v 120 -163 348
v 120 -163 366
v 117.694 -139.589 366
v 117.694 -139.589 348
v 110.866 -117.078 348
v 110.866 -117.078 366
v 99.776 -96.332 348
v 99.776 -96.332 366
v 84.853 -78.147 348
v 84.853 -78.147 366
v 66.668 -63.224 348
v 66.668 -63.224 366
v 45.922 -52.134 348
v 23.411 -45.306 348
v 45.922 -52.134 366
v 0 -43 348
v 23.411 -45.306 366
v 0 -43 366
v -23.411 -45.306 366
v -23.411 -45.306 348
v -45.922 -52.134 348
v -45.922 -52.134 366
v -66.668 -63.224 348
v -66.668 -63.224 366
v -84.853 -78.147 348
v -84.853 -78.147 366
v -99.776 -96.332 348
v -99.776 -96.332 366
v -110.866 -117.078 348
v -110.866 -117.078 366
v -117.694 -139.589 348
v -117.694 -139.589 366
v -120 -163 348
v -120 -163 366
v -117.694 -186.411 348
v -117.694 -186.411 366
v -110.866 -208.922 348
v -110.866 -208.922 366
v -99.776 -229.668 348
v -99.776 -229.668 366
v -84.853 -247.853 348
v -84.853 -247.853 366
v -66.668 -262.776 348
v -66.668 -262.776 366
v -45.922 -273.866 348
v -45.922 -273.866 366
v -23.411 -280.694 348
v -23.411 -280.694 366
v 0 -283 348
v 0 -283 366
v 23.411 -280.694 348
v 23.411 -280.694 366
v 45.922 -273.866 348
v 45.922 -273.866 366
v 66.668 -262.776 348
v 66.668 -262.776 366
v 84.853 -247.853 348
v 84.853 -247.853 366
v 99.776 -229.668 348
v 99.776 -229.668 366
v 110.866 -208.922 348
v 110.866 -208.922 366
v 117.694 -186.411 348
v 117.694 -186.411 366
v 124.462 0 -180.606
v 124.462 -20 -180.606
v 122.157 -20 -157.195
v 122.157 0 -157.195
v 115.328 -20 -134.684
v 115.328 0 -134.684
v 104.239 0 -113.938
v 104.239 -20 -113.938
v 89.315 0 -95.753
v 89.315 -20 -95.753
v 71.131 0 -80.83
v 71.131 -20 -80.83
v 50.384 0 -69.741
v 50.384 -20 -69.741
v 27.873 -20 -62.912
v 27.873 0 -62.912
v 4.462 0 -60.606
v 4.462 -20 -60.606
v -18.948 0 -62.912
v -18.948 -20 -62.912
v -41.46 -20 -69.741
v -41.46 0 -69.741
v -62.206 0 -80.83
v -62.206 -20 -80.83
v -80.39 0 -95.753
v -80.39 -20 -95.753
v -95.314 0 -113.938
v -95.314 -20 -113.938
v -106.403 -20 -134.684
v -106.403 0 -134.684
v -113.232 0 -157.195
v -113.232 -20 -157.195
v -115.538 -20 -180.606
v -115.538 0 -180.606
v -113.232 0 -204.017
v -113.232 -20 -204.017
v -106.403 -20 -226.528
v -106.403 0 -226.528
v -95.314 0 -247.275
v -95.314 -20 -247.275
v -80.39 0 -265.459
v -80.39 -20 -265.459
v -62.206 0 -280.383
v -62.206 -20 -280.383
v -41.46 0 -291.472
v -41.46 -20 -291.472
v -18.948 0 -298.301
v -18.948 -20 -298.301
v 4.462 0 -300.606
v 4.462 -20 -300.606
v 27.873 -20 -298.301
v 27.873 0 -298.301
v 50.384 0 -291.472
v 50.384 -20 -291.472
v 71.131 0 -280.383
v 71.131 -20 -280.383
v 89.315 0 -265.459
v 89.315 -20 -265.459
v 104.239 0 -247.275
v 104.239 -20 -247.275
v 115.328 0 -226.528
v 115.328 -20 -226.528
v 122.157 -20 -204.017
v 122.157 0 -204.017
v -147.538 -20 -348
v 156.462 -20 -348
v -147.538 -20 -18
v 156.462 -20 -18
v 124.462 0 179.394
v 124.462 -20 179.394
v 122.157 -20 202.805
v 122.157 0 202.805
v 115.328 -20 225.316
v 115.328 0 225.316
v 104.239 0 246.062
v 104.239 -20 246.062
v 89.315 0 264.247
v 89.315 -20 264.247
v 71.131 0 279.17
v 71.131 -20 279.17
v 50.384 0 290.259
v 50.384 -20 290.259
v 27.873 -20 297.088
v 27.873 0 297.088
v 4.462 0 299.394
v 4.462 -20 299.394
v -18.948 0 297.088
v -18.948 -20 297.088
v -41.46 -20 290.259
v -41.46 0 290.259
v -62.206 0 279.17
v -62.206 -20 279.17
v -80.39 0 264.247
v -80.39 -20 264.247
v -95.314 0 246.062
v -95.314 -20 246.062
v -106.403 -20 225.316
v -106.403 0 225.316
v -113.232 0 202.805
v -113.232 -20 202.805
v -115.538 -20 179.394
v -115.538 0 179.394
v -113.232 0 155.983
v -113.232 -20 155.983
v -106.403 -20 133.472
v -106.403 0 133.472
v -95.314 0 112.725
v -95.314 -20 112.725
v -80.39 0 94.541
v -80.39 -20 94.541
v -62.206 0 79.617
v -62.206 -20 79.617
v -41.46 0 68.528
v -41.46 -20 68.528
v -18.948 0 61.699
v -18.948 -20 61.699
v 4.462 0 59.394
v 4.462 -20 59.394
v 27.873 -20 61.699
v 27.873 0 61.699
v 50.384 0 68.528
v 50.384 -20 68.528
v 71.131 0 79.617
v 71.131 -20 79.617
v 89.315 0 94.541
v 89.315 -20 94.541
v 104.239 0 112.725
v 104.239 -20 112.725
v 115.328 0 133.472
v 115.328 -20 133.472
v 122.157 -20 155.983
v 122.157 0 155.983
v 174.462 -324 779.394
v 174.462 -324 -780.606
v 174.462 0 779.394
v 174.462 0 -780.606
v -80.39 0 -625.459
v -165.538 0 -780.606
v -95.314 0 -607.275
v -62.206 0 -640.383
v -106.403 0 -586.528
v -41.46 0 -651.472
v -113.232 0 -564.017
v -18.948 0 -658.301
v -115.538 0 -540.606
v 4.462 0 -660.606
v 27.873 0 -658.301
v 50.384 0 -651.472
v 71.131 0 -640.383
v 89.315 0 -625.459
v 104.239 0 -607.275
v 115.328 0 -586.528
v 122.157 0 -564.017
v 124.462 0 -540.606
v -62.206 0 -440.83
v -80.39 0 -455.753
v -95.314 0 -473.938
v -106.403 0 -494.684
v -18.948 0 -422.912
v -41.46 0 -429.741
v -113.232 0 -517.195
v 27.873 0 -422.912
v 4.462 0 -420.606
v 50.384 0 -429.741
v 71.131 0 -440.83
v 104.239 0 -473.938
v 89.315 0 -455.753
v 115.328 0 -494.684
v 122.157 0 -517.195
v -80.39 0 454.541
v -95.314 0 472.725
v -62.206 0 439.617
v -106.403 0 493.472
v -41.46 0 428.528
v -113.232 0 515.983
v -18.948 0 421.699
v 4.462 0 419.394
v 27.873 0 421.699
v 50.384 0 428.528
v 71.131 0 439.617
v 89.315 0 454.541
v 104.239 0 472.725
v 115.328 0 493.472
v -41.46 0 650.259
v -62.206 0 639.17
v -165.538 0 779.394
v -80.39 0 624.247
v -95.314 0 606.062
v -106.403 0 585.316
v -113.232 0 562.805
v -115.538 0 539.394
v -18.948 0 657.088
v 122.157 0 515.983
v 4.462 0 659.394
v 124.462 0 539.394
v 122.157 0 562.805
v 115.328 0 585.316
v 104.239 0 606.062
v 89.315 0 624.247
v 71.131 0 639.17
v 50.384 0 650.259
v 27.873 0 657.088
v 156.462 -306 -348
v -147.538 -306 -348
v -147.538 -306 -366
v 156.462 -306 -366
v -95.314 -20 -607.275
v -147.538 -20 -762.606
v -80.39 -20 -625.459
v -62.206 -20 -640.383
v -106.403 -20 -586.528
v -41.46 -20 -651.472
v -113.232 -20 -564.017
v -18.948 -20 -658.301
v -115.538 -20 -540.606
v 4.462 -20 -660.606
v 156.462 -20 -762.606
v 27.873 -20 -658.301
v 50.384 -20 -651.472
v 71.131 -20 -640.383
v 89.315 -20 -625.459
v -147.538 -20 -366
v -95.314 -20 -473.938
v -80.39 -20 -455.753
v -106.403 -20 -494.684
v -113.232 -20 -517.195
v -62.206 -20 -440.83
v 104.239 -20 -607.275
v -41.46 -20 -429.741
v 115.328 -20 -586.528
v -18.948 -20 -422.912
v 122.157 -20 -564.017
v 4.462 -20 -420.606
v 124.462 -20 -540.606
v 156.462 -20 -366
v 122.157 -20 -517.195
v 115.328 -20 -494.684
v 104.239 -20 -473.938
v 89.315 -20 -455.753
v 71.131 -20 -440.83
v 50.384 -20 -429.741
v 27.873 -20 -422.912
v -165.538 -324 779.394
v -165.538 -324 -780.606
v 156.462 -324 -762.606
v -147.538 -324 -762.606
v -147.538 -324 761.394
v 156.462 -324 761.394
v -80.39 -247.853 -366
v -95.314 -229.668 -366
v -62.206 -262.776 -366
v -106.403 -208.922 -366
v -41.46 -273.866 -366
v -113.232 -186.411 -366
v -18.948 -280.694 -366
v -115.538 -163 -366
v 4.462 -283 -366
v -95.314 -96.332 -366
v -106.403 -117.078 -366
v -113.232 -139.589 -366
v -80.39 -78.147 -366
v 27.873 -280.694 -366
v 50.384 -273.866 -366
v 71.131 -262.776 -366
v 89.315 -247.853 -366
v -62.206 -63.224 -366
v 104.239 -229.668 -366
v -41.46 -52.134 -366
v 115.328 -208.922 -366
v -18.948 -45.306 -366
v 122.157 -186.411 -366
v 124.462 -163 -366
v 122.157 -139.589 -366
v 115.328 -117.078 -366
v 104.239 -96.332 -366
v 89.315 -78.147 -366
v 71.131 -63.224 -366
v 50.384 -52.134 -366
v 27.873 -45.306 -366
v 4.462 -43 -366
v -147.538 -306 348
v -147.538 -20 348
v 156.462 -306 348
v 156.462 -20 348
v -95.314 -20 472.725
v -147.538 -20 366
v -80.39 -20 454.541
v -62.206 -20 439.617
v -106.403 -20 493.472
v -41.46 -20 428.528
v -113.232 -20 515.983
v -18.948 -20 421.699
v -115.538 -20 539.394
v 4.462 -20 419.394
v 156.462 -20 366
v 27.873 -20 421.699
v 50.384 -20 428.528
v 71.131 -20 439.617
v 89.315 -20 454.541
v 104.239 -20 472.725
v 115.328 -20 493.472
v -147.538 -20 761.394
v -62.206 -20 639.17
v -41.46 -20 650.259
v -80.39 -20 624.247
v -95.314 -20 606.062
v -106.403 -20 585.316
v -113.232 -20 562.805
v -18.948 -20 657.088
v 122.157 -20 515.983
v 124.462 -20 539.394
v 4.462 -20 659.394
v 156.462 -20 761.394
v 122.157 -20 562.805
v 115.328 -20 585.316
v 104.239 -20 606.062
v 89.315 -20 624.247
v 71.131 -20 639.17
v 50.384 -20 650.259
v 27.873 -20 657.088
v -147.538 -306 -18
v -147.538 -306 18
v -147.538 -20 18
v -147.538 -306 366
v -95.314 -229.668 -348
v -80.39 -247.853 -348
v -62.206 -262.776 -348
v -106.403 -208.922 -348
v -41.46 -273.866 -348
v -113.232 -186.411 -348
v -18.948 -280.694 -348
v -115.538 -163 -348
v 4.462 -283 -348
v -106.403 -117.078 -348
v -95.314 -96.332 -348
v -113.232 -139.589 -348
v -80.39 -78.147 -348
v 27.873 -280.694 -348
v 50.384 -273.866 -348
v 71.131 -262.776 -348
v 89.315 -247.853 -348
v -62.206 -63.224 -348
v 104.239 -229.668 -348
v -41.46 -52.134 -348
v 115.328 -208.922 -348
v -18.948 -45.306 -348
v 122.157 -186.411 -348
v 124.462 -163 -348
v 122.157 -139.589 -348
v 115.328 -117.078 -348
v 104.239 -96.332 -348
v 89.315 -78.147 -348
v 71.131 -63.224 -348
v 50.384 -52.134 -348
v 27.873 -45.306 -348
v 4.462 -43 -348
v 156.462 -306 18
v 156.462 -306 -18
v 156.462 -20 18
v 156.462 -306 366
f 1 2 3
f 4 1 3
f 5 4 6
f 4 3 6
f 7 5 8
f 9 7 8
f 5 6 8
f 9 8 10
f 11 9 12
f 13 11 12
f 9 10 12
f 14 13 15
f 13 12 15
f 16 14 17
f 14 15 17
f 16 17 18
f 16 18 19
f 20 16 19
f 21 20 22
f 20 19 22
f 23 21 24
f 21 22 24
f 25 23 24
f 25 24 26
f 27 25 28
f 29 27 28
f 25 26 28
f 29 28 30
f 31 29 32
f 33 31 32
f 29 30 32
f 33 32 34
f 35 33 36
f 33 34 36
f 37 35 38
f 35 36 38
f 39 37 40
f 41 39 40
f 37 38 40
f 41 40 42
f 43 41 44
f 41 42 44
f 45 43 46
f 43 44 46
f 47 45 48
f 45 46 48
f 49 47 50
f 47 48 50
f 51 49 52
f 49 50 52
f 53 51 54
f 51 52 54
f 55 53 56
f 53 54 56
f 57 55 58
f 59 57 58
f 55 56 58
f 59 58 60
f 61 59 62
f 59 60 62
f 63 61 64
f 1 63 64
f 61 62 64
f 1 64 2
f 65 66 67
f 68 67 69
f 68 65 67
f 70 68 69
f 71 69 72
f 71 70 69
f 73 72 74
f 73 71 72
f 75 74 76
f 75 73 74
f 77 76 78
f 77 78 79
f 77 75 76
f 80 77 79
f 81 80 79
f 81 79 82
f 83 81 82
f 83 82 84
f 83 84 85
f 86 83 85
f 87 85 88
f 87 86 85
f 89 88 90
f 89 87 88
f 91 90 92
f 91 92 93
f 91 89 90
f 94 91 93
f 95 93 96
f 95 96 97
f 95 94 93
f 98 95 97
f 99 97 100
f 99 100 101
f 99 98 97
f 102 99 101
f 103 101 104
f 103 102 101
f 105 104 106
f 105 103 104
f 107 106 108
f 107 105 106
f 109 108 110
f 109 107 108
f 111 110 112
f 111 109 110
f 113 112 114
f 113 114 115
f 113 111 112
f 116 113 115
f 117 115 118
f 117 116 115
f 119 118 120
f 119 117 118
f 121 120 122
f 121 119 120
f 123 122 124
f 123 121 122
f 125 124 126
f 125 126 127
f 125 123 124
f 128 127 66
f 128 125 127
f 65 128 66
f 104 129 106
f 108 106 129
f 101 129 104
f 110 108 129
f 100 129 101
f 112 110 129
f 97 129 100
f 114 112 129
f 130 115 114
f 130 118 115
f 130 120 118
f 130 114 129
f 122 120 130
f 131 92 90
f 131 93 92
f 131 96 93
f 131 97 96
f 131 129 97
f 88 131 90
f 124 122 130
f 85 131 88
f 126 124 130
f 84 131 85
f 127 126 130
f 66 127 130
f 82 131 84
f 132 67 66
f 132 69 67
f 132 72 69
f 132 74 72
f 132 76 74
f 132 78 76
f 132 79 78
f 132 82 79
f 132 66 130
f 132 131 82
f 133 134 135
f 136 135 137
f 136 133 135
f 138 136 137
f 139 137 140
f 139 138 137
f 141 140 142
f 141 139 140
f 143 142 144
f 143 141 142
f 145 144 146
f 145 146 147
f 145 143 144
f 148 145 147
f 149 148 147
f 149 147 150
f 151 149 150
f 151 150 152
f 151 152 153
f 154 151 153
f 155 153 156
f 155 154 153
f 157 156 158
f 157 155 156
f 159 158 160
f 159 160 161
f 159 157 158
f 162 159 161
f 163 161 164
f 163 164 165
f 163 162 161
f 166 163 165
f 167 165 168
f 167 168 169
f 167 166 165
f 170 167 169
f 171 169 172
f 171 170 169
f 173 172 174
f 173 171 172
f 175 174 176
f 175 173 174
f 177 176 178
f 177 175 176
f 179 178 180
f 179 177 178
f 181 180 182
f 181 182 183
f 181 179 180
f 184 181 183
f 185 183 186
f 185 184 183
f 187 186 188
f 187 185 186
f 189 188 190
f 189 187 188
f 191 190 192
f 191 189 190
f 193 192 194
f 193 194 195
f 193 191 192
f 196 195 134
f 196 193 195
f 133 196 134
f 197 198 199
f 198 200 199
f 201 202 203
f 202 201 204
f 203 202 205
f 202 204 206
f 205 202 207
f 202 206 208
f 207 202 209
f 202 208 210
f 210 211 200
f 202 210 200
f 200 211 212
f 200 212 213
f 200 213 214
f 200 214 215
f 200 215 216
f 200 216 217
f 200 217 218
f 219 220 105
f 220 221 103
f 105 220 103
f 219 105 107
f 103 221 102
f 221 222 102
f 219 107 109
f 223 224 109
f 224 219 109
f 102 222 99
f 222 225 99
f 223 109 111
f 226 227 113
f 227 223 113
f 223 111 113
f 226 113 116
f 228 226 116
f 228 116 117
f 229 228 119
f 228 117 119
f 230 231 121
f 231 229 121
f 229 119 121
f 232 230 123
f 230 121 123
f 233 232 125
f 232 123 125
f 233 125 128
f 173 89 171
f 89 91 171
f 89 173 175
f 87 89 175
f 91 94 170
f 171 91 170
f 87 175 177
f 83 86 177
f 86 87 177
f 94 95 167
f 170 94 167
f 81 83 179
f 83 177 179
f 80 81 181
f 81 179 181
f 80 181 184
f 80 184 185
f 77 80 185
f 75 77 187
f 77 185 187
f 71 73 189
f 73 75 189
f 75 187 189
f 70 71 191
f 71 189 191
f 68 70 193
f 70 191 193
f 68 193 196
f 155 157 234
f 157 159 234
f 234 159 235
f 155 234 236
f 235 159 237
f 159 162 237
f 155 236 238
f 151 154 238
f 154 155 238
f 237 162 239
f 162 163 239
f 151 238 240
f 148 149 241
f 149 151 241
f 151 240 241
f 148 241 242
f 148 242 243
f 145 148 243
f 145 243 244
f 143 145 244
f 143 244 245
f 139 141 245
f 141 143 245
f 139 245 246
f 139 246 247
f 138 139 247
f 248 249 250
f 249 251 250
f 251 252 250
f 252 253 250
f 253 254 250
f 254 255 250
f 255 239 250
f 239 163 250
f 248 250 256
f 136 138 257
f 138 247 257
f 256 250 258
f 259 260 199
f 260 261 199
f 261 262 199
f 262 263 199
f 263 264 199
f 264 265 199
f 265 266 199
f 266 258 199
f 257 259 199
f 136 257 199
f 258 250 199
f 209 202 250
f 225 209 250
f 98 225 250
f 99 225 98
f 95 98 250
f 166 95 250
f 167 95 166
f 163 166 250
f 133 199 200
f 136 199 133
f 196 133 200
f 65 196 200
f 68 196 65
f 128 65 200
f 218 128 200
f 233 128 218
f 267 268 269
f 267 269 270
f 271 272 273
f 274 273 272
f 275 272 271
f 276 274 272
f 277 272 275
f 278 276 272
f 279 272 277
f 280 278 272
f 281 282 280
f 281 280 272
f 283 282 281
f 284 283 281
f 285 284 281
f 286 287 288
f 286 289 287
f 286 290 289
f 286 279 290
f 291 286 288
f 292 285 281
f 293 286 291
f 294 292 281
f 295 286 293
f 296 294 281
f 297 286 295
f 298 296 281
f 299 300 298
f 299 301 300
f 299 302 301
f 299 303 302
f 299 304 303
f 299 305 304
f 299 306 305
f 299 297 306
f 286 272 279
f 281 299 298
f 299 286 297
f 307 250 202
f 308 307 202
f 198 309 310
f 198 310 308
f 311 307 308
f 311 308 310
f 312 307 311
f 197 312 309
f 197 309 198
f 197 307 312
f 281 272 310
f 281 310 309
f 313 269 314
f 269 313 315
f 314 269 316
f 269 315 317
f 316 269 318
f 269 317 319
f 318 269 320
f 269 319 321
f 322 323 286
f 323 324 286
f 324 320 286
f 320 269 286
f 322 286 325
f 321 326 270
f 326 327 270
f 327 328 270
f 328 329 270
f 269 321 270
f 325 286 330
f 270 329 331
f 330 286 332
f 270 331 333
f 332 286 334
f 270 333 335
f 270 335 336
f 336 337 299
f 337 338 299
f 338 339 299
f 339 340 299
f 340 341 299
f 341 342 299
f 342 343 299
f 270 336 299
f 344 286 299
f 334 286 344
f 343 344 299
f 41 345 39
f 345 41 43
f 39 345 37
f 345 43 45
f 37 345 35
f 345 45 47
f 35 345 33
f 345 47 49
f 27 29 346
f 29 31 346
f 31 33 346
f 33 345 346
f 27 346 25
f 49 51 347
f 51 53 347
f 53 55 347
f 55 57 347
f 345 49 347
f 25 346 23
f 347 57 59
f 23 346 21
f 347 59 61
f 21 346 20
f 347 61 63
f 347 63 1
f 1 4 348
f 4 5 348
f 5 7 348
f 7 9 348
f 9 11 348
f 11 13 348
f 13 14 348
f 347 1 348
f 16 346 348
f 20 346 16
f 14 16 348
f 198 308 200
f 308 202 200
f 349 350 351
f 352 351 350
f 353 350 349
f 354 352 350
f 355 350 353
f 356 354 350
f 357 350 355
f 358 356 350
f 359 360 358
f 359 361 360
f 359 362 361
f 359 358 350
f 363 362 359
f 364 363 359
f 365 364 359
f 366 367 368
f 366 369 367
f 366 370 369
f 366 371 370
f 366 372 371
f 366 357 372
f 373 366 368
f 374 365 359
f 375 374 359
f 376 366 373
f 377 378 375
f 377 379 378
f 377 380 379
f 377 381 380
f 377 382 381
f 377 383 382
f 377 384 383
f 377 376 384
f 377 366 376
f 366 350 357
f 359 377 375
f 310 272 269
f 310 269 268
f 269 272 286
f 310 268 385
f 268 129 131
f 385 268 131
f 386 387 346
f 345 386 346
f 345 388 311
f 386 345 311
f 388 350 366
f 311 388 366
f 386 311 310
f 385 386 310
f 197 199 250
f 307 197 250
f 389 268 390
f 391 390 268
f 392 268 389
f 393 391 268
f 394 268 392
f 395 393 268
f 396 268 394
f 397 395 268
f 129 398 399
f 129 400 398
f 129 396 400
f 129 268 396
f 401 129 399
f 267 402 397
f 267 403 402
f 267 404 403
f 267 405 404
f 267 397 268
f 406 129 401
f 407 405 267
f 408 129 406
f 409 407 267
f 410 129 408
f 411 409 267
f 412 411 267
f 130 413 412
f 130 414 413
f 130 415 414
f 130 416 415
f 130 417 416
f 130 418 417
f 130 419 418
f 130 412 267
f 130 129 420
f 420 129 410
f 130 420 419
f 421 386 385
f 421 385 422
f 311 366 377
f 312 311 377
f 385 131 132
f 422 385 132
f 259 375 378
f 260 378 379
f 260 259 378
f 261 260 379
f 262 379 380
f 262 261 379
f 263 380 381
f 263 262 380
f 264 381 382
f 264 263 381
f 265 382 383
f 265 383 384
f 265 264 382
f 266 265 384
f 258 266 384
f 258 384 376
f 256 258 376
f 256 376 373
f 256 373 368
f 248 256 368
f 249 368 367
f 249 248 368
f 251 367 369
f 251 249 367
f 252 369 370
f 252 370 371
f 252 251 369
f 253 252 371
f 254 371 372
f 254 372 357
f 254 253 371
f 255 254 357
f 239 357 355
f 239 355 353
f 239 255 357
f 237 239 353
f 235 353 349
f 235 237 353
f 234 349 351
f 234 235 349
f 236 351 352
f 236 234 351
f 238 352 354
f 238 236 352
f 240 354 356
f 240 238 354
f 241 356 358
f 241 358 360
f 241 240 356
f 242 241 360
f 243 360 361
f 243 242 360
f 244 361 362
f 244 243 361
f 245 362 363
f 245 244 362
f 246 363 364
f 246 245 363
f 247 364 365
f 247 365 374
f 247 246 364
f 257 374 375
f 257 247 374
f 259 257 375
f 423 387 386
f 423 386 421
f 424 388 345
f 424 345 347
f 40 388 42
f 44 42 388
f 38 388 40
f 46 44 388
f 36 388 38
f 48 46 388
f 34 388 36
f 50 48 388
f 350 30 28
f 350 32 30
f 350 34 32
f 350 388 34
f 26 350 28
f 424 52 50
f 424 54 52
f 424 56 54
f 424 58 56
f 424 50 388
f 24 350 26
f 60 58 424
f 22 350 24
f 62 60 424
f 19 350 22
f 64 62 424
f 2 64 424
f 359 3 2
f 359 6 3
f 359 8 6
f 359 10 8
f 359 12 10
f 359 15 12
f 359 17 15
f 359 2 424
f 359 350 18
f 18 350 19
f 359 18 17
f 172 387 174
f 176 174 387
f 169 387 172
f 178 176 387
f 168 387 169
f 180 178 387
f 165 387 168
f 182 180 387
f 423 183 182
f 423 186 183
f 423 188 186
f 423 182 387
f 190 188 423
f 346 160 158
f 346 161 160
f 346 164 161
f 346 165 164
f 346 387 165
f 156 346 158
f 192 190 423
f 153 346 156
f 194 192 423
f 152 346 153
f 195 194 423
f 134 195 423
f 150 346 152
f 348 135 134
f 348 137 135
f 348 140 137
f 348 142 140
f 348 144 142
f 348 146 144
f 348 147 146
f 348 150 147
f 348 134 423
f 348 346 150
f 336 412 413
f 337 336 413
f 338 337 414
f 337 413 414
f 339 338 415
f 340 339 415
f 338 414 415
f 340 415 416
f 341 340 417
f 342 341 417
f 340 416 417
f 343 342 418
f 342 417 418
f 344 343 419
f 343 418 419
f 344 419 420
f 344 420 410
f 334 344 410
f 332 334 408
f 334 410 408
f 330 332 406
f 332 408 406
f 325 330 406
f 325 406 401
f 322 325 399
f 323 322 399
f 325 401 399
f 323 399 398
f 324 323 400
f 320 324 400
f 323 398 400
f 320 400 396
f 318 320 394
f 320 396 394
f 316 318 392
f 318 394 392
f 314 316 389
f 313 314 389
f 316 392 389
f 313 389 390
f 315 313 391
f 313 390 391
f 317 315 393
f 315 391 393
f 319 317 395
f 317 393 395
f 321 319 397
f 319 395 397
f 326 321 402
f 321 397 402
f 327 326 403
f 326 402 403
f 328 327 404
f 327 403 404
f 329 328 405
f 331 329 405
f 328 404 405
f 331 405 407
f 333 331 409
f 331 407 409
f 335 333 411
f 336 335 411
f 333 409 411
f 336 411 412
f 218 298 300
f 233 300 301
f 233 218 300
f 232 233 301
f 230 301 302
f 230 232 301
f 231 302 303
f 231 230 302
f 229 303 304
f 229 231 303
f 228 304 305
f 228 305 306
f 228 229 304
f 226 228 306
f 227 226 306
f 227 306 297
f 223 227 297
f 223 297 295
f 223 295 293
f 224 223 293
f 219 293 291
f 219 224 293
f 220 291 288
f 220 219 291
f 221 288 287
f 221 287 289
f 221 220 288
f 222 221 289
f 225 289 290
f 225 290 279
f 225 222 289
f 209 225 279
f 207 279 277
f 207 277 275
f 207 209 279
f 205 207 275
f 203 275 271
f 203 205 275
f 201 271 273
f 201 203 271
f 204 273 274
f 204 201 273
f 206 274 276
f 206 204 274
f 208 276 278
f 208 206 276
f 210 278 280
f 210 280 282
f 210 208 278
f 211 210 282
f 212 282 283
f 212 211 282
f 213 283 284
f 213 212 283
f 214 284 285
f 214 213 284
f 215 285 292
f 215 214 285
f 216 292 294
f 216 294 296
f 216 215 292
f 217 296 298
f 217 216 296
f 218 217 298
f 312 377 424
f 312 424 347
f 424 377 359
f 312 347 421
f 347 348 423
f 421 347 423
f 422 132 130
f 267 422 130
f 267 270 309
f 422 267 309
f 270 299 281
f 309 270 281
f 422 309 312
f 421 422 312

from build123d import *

# Parameters (mm, degrees)
F0_W     = 340
F0_H     = 1560
F0_R     = 120
F1_DEPTH = 20
F2_W     = 304
F2_H     = 18
F3_DEPTH = 304
F4_DEPTH = 286
F5_R     = 120
F6_DEPTH = 18
F8_DEPTH = 18
F7_R     = 120
F9_DEPTH = 18


with BuildPart() as f1:
    # F0 (on Front) → F1 (new body)
    with BuildSketch(Plane.XZ):
        with Locations((4.462467, -0.60629)):
            Rectangle(F0_W, F0_H)
        with Locations((4.462467, -540.60629)):
            Circle(F0_R, mode=Mode.SUBTRACT)
        with Locations((4.462467, -180.60629)):
            Circle(F0_R, mode=Mode.SUBTRACT)
        with Locations((4.462467, 179.39371)):
            Circle(F0_R, mode=Mode.SUBTRACT)
        with Locations((4.462467, 539.39371)):
            Circle(F0_R, mode=Mode.SUBTRACT)
    extrude(amount=F1_DEPTH)

    # F2 (on face) → F3 (join)
    with BuildSketch(Plane.XZ.offset(20)):
        Polygon((-165.537533, 779.39371), (-165.537533, -780.60629), (-147.537533, -780.60629), (-147.537533, -762.60629), (-147.537533, -366), (-147.537533, -348), (-147.537533, -18), (-147.537533, 0), (-147.537533, 18), (-147.537533, 348), (-147.537533, 366), (-147.537533, 761.39371), (-147.537533, 779.39371), align=None)
        with Locations((4.462467, 770.39371)):
            Rectangle(F2_W, F2_H)
        Polygon((156.462467, -762.60629), (156.462467, -780.60629), (174.462467, -780.60629), (174.462467, 779.39371), (156.462467, 779.39371), (156.462467, 761.39371), (156.462467, 366), (156.462467, 348), (156.462467, 18), (156.462467, 0), (156.462467, -18), (156.462467, -348), (156.462467, -366), align=None)
        with Locations((4.462467, -771.60629)):
            Rectangle(F2_W, F2_H)
    extrude(amount=F3_DEPTH)

    # F2 (on face) → F4 (join)
    with BuildSketch(Plane.XZ.offset(20)):
        with Locations((4.462467, -357)):
            Rectangle(F2_W, F2_H)
        with Locations((4.462467, 9)):
            Rectangle(F2_W, F2_H)
        with Locations((4.462467, -9)):
            Rectangle(F2_W, F2_H)
        with Locations((4.462467, 357)):
            Rectangle(F2_W, F2_H)
    extrude(amount=F4_DEPTH)

    # F5 (on face) → F6 (cut)
    with BuildSketch(Plane.XY.offset(366)):
        with Locations((0, -163)):
            Circle(F5_R)
    extrude(amount=-F6_DEPTH, mode=Mode.SUBTRACT)

    # F5 (on face) → F8 (cut)
    with BuildSketch(Plane.XY.offset(366)):
        with Locations((0, -163)):
            Circle(F5_R)
    extrude(amount=-F8_DEPTH, mode=Mode.SUBTRACT)

    # F7 (on face) → F9 (cut)
    with BuildSketch(Plane.XY.offset(-348)):
        with Locations((4.462467, -163)):
            Circle(F7_R)
    extrude(amount=-F9_DEPTH, mode=Mode.SUBTRACT)


solid = f1.part
